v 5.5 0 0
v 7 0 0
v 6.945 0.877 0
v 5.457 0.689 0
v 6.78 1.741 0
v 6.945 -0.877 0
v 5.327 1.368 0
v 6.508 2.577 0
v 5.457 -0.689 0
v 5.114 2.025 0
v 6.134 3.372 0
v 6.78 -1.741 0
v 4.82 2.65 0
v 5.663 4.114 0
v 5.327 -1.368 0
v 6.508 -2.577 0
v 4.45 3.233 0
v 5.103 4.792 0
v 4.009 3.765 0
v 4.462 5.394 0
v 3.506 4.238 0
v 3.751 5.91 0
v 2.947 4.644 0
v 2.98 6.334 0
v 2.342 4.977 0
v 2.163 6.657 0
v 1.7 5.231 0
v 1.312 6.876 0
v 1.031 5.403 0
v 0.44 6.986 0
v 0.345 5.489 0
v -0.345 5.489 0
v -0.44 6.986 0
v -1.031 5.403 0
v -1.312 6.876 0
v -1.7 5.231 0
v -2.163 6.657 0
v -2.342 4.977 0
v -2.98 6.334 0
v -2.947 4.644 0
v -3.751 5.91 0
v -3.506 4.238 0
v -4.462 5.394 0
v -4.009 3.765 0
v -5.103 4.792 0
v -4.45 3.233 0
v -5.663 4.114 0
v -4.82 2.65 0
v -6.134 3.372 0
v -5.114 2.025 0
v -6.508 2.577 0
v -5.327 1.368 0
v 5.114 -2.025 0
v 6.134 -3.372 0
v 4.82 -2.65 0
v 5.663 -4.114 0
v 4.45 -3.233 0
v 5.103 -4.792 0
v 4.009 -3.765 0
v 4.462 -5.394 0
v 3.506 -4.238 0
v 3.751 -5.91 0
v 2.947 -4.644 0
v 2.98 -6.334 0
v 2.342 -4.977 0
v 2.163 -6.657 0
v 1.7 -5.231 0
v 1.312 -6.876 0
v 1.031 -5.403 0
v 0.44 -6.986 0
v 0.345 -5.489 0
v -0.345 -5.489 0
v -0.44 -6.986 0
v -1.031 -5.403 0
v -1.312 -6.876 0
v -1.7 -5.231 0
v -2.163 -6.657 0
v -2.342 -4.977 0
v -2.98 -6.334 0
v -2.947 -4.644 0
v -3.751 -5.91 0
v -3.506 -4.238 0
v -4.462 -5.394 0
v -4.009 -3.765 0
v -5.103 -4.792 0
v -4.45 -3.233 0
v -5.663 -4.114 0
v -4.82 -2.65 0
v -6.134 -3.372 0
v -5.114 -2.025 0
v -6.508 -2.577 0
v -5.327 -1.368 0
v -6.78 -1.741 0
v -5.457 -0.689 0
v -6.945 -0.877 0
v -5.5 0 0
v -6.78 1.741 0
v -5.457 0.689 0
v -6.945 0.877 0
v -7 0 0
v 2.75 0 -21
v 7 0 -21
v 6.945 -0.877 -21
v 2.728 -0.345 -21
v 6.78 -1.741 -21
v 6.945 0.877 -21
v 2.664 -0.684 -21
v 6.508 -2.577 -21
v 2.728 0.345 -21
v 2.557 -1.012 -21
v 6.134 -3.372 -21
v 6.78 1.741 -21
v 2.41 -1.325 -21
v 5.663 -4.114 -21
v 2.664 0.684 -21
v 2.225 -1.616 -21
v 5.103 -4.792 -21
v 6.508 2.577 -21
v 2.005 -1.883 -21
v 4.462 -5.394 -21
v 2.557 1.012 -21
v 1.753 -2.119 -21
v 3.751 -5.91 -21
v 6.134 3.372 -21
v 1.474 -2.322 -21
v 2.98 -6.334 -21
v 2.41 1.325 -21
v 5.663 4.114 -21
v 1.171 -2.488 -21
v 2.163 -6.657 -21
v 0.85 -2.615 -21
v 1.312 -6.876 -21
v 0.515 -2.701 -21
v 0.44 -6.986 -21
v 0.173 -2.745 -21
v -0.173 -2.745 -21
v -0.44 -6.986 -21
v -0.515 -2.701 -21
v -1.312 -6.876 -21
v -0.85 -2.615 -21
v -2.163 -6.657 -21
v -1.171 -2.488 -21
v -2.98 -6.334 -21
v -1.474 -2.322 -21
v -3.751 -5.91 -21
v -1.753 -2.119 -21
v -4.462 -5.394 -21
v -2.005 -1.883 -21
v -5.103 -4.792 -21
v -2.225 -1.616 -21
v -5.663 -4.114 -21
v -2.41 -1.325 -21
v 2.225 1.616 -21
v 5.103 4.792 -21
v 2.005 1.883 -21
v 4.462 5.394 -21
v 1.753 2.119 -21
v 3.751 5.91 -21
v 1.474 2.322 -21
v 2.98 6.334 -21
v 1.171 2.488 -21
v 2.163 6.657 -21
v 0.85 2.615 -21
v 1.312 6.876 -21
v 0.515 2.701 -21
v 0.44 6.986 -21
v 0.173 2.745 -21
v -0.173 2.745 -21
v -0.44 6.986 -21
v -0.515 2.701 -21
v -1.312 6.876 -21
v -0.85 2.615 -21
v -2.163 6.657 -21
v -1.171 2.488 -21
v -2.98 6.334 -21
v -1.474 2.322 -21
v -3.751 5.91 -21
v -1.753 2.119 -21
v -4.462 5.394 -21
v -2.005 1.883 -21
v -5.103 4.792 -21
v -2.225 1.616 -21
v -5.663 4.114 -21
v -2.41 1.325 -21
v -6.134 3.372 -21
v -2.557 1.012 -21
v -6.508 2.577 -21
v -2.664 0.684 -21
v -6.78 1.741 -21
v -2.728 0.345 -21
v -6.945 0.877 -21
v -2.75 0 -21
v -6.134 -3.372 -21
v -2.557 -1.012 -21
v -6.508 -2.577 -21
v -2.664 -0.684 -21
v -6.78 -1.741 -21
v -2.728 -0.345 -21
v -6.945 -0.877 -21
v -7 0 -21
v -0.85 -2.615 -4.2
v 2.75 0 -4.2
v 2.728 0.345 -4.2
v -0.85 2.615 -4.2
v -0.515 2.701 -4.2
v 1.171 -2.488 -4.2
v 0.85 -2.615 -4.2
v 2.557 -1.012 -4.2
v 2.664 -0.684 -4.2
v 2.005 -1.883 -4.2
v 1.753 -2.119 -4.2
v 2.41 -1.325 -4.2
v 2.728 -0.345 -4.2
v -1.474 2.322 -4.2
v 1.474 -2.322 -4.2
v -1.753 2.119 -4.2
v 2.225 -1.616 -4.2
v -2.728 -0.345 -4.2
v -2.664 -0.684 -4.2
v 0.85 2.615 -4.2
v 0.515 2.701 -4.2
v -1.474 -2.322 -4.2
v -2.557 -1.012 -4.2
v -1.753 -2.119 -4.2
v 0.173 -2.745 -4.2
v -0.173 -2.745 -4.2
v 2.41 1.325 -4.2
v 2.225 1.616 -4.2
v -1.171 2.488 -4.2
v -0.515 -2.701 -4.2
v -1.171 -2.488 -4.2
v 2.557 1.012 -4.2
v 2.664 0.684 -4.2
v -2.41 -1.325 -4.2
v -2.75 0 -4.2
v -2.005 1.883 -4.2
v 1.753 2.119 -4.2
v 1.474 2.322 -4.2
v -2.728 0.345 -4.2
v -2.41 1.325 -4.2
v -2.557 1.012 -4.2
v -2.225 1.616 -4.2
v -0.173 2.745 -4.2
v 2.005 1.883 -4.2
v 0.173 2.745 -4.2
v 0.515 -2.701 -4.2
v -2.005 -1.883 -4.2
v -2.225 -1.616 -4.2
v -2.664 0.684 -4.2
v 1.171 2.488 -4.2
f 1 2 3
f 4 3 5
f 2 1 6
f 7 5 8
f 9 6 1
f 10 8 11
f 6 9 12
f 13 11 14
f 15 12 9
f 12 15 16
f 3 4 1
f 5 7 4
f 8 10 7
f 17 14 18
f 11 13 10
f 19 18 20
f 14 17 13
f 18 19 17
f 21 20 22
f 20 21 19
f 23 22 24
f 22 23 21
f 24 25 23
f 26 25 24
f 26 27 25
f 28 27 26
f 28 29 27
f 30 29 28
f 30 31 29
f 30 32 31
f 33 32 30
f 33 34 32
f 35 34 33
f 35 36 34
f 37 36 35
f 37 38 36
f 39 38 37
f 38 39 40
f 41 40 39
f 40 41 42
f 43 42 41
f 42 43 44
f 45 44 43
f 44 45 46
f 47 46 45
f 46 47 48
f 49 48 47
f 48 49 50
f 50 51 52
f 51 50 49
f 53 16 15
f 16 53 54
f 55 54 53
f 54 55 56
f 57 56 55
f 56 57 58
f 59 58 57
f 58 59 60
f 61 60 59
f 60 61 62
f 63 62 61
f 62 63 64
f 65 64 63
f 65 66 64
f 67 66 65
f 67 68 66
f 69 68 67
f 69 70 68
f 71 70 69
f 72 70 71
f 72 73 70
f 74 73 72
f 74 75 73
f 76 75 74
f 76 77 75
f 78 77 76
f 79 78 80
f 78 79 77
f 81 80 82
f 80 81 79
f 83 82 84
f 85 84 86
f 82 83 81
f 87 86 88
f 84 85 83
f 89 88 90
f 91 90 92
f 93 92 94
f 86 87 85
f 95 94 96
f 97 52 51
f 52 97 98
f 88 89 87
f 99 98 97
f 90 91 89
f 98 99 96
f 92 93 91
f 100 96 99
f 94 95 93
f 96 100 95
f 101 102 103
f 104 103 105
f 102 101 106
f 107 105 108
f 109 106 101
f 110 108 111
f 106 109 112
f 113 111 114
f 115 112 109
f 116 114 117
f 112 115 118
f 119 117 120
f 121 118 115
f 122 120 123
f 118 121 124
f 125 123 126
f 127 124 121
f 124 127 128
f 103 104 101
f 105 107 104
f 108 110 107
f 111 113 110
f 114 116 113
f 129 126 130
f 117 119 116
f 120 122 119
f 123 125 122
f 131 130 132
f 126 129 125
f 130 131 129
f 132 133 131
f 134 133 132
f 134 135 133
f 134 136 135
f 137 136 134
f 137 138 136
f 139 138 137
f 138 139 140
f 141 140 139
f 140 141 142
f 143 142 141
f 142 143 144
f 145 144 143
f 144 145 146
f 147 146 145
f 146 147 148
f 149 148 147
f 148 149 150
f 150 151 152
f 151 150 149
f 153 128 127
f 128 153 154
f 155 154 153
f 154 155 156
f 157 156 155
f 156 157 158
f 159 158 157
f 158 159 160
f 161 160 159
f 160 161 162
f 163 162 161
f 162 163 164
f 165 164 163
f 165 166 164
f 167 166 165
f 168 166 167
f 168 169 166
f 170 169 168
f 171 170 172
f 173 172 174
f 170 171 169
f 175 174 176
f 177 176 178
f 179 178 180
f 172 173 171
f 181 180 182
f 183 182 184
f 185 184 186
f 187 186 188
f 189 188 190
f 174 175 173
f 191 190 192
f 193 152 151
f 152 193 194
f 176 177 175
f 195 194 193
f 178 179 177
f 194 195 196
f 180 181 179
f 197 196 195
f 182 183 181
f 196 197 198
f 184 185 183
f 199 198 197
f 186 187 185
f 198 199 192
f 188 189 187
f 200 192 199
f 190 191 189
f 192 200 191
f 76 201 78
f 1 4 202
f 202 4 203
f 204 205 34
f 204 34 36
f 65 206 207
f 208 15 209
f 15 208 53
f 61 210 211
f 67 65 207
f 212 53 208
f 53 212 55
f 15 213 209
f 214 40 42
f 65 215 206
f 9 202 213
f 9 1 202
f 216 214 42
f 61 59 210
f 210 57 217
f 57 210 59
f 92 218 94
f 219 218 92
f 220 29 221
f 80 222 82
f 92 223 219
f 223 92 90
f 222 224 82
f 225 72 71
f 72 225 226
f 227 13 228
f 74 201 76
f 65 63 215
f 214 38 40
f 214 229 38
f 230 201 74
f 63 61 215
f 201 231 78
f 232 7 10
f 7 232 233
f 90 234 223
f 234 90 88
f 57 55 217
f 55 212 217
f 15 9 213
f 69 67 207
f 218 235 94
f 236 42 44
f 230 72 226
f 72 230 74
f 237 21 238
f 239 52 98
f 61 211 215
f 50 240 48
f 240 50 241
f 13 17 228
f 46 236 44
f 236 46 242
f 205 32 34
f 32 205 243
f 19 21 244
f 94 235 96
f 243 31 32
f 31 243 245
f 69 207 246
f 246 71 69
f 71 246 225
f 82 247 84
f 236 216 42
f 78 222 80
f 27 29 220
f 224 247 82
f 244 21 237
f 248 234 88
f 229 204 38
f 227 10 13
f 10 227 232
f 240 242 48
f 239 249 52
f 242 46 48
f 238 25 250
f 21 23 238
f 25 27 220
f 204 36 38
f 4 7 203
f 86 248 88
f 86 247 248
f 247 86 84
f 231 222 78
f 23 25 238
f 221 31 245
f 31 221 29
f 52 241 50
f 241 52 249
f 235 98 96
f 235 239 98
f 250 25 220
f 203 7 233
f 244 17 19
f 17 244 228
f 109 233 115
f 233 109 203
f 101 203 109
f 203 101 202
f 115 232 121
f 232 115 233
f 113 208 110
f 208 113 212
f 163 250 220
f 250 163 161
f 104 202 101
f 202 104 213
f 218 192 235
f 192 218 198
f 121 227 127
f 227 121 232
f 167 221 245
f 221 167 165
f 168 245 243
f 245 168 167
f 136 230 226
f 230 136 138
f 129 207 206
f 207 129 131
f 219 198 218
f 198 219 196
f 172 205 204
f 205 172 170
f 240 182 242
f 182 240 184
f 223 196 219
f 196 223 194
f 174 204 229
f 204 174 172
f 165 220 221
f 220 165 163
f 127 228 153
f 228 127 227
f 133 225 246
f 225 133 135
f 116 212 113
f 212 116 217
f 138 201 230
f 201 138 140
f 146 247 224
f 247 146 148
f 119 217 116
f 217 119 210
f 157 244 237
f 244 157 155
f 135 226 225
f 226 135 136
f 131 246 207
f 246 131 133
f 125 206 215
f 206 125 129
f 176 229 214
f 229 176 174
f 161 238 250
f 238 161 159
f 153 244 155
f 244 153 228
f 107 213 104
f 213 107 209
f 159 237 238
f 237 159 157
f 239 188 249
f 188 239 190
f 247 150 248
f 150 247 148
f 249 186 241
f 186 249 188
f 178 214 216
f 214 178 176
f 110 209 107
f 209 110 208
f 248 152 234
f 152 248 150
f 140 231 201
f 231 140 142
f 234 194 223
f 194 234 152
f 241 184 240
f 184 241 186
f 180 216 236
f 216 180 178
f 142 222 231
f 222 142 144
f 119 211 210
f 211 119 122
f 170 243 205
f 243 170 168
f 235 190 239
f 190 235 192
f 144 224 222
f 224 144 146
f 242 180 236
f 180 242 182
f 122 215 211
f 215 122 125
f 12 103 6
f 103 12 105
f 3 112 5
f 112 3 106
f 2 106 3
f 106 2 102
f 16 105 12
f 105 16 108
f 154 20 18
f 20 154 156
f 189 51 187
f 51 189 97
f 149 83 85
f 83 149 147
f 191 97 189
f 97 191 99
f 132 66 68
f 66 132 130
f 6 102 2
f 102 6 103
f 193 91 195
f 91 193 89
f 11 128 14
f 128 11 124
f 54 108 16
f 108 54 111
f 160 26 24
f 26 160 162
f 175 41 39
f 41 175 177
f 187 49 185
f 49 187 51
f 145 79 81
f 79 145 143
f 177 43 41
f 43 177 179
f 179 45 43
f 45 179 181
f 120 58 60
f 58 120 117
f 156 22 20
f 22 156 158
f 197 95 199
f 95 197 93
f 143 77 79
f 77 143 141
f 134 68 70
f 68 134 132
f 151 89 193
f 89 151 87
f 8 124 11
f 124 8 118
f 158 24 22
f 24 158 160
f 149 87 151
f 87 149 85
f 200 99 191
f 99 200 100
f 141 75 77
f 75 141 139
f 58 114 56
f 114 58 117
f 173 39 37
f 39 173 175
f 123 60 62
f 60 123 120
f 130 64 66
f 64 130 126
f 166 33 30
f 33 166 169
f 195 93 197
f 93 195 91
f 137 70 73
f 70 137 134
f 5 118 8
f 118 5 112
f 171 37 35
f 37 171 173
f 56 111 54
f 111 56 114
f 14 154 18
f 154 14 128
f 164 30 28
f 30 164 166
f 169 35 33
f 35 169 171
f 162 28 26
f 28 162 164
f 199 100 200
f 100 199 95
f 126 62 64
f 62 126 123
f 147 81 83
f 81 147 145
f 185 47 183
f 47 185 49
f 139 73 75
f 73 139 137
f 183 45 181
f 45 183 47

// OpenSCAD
$fn = 50;


difference() {
	union() {
		translate(v = [0, 0, -21.0000000000]) {
			cylinder(h = 21, r = 7.0000000000);
		}
		cylinder(h = 0, r = 17.0000000000);
	}
	union() {
		translate(v = [0, 0, 0]) {
			rotate(a = [0, 0, 0]) {
				difference() {
					union() {
						#translate(v = [0, 0, -21.0000000000]) {
							cylinder(h = 21, r = 2.2500000000);
						}
						#translate(v = [0, 0, -4.2000000000]) {
							cylinder(h = 4.2000000000, r1 = 2.7500000000, r2 = 5.5000000000);
						}
						#translate(v = [0, 0, -21.0000000000]) {
							cylinder(h = 21, r = 2.7500000000);
						}
						#translate(v = [0, 0, -21.0000000000]) {
							cylinder(h = 21, r = 2.2500000000);
						}
					}
					union();
				}
			}
		}
	}
}
